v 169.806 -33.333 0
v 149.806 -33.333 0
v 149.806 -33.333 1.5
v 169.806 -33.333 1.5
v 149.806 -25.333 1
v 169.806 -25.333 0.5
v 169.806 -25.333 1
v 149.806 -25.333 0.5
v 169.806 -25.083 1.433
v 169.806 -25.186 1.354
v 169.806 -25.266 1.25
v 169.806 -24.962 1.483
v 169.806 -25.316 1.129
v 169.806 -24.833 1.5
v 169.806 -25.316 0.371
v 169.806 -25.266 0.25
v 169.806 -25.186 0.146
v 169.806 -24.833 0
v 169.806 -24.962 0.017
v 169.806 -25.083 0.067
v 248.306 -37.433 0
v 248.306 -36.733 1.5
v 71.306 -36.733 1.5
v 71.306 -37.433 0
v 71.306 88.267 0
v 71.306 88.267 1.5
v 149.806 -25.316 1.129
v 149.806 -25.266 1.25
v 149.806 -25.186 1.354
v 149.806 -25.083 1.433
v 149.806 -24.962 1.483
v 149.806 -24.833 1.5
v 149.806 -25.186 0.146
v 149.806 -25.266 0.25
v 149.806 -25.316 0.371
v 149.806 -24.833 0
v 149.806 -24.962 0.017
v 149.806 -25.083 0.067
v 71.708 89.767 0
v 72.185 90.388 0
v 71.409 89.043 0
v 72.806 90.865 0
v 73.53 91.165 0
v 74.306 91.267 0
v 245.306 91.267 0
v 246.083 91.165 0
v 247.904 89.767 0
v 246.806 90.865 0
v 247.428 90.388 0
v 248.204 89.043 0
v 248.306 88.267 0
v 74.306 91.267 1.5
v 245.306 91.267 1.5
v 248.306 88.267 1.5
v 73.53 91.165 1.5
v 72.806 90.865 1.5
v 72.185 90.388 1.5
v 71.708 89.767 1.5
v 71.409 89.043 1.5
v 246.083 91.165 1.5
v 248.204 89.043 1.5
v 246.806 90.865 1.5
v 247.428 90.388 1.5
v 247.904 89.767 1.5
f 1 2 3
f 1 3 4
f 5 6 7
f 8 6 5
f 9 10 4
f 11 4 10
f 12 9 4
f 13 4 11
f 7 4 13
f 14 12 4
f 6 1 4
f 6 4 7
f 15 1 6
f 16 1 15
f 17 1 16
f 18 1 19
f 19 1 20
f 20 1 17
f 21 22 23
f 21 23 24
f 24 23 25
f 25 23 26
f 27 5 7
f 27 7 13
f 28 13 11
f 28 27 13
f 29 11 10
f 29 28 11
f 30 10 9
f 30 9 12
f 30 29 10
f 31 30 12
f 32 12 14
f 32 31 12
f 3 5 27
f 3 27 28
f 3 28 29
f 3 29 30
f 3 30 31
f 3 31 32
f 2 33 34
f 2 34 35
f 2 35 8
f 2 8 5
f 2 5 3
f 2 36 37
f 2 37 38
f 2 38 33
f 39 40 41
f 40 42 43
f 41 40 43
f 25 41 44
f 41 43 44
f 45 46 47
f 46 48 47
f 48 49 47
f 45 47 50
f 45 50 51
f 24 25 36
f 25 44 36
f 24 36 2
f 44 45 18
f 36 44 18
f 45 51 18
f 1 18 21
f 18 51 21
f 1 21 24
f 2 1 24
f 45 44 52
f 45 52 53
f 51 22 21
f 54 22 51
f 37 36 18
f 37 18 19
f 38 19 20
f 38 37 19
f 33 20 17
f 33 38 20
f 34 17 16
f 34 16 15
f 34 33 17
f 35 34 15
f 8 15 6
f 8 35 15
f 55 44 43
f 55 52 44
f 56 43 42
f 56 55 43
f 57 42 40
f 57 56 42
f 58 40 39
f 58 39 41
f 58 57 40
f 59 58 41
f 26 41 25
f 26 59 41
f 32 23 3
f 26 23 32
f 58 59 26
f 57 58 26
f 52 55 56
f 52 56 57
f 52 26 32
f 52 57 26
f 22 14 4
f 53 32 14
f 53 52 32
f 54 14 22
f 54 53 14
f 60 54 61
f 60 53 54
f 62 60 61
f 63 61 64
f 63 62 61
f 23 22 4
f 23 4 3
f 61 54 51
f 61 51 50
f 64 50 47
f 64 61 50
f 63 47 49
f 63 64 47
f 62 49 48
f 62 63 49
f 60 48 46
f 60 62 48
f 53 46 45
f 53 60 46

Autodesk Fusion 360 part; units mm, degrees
sketch "Sketch1" plane through (0, 0, 0) normal (0, 0, 1) x (1, 0, 0)
  line L0 (244.9063, 87.8669) -> (244.9063, -23.3331)
  line L1 (78.2063, -13.5431) -> (78.2063, 84.3769)
  line L2 (241.4063, 84.3769) -> (241.4063, -13.5431)
  line L3 (244.9063, -23.3331) -> (74.7063, -23.3331)
  line L4 (71.3063, 91.2669) -> (248.3063, 91.2669)
  line L5 (244.9063, 87.8669) -> (244.9063, -33.3331)
  line L6 (74.7063, -23.3331) -> (74.7063, 87.8669)
  line L7 (169.8063, -23.3331) -> (149.8063, -23.3331)
  line L8 (169.8063, -33.3331) -> (169.8063, -23.3331)
  line L9 (149.8063, -33.3331) -> (169.8063, -33.3331)
  line L10 (149.8063, -23.3331) -> (149.8063, -33.3331)
  line L11 (74.7063, -33.3331) -> (74.7063, 87.8669)
  line L12 (74.3063, 88.2669) -> (245.3063, 88.2669)
  line L13 (245.3063, 88.2669) -> (245.3063, -23.7331)
  line L14 (74.7063, 87.8669) -> (244.9063, 87.8669)
  line L15 (78.2063, 84.3769) -> (241.4063, 84.3769)
  line L16 (74.7063, 87.8669) -> (244.9063, 87.8669)
  line L17 (74.3063, -23.7331) -> (74.3063, 88.2669)
  line L18 (241.4063, -13.5431) -> (78.2063, -13.5431)
  line L19 (245.3063, -23.7331) -> (74.3063, -23.7331)
  line L20 (248.3063, 91.2669) -> (248.3063, -36.7331)
  line L21 (248.3063, -36.7331) -> (71.3063, -36.7331)
  line L22 (71.3063, -36.7331) -> (71.3063, 91.2669)
  line L23 (244.9063, -33.3331) -> (74.7063, -33.3331)
  line L24 (149.8063, -23.3331) -> (169.8063, -23.3331)
  line L25 (169.8063, -23.3331) -> (169.8063, -25.3329)
  line L26 (169.8063, -25.3329) -> (149.8063, -25.3329)
  line L27 (149.8063, -25.3329) -> (149.8063, -23.3331)
  dimension "d1" = -3.4
  dimension "d2" = -0.4
  dimension "d3" = 97.92
  dimension "d4" = 163.2
  dimension "d5" = 170.2
  dimension "d6" = 3.5
  dimension "d7" = 111.2
  dimension "d8" = 3.49
  dimension "d9" = 10
  dimension "d10" = 20
  dimension "d11" = 75.1
  dimension "d12" = 75.1
extrude "Extrude1" add sketch "Sketch1" along normal blind 1.5 contours L0 L5 L6 L11 L12 L13 L14 L16 L17 L19 | L0 L3 L5 L6 L7 L11 L14 L16 L24 | L3 L5 L8 L19 L25 | L3 L7 L8 L10 L19 L24 L25 L27 | L5 L8 L19 L23 L25 | L3 L10 L11 L19 L27 | L8 L10 L19 L25 L26 L27 | L10 L11 L19 L23 L27 | L1 L2 L15 L18 | L4 L20 L21 L22
fillet "Fillet1" radius 3 2 edges at (248.3063, 91.2669, 0.75) (71.3063, 91.2669, 0.75)
fillet "Fillet2" radius 0.5 2 edges at (159.8063, -25.3329, 0) (159.8063, -25.3329, 1.5)
sketch "Sketch2" plane through (248.3063, 0, 0) normal (1, 0, 0) x (0, 1, 0)
  line L0 (88.2669, 0) -> (88.2669, 1.5)
  line L1 (88.2669, 1.5) -> (-36.7331, 1.5)
  line L2 (-36.7331, 1.5) -> (-36.7331, 0)
  line L3 (-36.7331, 0) -> (88.2669, 0)
  line L4 (-36.7331, 1.5) -> (-37.9806, -1.1754)
  line L5 (-36.7331, 1.5) -> (-33.7811, 1.5) construction
  line L6 (-36.7331, 0) -> (-38.6066, 0)
  dimension "d19" = 115
extrude "Extrude2" add sketch "Sketch2" against normal up to surface (177 mm away) contours L2 L4 L6
